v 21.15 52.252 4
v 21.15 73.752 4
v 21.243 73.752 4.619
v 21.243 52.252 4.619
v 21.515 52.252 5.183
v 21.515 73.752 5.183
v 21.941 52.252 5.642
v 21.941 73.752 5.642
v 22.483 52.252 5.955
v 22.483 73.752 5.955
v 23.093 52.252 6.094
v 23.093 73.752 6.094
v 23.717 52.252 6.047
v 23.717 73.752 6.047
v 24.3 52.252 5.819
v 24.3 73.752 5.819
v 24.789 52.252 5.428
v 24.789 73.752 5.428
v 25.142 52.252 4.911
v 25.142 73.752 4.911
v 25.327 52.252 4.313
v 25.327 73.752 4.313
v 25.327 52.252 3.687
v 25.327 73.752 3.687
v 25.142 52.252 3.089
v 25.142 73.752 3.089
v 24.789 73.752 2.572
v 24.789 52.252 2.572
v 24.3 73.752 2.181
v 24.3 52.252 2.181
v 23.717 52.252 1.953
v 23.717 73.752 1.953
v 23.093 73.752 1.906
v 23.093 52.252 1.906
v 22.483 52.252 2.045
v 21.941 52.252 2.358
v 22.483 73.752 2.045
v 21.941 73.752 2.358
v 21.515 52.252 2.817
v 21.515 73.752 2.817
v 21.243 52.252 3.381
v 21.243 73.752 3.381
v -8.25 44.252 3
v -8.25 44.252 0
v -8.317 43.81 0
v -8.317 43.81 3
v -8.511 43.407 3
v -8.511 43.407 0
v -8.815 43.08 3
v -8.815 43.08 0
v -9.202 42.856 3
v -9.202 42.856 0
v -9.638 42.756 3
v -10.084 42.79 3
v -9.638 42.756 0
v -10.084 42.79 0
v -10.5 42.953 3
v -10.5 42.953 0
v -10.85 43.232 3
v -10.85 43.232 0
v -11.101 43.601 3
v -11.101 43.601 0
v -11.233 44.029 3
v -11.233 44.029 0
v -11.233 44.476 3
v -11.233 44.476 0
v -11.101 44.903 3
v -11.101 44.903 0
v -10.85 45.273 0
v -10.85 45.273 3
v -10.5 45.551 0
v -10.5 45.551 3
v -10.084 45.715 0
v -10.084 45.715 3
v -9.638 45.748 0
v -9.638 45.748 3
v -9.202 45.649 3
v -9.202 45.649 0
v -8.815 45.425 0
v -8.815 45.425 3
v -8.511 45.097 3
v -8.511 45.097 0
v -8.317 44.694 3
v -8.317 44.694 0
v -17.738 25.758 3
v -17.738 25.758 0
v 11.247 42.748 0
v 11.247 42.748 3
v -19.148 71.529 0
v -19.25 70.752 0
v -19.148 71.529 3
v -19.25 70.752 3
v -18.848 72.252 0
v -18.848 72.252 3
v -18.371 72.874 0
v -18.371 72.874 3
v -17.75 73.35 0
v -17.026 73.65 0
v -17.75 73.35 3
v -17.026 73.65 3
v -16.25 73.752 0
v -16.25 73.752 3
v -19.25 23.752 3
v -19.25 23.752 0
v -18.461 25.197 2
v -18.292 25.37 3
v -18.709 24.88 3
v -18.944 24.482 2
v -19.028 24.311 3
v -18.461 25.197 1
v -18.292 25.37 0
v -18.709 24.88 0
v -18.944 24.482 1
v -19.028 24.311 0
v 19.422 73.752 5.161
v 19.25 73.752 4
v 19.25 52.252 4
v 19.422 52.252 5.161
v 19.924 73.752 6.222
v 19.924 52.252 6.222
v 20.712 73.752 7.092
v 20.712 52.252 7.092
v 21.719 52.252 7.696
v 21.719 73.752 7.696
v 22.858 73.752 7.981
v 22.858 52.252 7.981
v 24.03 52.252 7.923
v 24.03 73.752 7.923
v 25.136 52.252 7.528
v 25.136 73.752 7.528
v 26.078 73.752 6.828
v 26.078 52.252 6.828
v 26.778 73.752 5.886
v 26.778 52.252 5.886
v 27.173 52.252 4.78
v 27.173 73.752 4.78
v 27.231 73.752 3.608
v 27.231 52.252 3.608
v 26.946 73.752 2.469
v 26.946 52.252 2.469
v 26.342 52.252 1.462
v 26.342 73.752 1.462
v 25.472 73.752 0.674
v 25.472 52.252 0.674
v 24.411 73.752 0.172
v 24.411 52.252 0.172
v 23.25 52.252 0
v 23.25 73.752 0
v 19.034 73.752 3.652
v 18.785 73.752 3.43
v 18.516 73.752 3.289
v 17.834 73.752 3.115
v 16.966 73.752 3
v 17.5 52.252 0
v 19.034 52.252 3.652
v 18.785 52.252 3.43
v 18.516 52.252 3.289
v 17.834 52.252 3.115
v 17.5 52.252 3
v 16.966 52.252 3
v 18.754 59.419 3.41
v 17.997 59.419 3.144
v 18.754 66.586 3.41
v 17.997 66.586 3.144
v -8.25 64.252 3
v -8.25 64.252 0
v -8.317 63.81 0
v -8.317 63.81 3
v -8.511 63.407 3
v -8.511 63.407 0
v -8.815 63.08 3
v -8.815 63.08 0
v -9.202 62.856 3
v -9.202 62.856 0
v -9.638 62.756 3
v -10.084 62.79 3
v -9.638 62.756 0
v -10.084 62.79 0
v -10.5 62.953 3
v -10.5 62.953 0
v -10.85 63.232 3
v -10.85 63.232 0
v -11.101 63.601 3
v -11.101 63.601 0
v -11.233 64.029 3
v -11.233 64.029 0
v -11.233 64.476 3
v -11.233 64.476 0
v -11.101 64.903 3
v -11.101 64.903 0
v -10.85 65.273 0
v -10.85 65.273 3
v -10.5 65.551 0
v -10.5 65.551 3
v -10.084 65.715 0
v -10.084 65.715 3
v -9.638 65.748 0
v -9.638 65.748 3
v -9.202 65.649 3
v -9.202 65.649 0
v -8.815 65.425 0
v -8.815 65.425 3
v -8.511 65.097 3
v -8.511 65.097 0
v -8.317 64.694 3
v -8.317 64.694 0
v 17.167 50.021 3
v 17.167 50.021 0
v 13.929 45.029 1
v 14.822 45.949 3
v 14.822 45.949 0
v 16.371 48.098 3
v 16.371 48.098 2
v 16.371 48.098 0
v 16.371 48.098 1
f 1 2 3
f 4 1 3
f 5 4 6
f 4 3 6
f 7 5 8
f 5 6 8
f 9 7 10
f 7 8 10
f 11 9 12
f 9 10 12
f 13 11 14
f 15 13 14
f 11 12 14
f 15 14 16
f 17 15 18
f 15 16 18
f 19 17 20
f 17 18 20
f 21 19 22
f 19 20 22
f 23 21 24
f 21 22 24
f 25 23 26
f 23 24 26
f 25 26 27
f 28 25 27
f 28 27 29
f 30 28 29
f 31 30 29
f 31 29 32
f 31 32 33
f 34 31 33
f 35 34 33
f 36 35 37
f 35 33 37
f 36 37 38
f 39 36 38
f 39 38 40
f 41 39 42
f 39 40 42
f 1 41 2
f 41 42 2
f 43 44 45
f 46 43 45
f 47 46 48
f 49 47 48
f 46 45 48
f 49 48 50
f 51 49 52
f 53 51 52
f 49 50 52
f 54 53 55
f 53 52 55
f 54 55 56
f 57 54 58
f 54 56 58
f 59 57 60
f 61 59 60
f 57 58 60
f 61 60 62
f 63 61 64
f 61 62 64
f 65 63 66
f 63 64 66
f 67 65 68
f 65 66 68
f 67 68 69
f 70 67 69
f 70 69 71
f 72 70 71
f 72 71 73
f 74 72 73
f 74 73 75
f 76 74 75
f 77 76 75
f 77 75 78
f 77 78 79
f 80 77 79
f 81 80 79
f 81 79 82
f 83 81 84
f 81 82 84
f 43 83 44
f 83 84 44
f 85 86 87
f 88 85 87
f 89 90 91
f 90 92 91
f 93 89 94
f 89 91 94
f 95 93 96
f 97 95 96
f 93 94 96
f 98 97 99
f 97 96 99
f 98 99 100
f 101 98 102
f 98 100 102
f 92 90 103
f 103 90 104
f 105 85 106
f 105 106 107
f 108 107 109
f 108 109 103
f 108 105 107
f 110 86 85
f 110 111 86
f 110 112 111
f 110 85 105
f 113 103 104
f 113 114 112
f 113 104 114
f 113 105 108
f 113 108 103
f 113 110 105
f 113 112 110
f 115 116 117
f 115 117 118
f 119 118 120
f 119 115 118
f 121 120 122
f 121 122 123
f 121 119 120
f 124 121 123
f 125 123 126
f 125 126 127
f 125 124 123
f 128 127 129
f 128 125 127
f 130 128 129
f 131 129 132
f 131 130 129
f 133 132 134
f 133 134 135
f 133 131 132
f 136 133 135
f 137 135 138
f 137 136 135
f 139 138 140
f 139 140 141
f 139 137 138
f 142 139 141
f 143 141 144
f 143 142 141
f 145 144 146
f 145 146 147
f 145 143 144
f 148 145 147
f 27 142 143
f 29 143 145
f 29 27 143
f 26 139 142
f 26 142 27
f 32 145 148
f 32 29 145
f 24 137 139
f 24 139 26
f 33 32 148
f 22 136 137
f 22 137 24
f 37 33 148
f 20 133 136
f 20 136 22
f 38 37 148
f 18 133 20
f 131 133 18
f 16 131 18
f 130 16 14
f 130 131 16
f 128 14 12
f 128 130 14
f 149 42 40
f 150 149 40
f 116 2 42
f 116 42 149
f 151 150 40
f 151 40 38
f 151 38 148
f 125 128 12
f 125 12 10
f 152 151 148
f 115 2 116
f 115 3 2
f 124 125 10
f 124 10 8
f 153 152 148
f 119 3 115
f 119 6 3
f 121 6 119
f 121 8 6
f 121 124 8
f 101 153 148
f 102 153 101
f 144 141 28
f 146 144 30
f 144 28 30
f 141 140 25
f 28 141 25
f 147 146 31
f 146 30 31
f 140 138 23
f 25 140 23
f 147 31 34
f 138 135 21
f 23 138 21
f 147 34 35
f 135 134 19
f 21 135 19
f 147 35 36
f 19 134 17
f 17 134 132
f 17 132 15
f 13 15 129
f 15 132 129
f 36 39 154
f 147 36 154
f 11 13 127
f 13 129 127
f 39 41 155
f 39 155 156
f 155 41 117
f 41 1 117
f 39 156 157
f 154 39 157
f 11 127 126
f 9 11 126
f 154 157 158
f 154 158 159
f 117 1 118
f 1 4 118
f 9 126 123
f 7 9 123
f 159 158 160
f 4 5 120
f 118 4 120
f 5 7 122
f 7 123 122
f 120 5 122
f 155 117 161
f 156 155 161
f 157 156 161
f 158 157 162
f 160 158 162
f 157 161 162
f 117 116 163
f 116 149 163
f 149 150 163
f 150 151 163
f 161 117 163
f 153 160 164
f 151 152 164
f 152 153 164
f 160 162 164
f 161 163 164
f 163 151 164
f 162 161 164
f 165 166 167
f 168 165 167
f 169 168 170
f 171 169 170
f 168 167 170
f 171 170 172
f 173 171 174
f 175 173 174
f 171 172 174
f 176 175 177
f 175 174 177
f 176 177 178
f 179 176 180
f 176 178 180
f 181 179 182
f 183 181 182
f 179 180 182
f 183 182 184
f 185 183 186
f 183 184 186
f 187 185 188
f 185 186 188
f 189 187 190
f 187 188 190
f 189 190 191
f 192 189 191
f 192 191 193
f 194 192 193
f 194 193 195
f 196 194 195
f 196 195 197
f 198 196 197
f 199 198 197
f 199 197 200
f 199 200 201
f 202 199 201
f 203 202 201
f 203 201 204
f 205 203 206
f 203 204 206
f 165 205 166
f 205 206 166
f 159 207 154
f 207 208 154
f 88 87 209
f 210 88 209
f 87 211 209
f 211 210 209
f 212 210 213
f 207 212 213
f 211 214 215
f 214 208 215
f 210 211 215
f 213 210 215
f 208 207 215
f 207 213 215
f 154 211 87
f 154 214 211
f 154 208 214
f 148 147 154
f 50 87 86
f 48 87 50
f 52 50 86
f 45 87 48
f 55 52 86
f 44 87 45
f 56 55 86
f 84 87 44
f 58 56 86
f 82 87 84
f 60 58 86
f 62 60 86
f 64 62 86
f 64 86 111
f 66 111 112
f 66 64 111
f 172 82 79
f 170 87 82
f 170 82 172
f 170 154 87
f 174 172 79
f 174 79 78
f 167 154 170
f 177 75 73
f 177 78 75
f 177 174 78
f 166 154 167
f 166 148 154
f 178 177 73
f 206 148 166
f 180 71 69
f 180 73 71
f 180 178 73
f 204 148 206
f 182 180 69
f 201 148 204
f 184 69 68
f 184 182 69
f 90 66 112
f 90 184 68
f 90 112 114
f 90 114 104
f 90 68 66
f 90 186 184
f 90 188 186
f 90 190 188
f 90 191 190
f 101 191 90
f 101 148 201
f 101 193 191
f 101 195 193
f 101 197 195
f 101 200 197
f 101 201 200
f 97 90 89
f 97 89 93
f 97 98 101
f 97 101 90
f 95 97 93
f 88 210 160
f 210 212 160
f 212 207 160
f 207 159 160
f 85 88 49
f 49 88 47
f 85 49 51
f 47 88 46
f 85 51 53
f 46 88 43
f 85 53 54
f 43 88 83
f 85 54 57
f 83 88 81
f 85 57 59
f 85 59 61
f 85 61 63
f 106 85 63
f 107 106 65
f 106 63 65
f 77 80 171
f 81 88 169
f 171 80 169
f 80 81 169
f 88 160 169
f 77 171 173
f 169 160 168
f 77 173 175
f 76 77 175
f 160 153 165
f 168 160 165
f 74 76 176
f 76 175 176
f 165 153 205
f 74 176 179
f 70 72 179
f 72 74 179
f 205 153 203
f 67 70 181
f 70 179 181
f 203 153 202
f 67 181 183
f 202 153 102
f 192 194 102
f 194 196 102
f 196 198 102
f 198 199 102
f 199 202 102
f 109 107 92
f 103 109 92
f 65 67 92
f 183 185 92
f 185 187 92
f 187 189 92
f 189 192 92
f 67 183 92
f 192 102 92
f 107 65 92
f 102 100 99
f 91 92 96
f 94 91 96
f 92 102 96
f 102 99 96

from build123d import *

# Parameters (mm, degrees)
F1_DEPTH = 3
F2_R     = 2.1
F3_DEPTH = 21.5
F4_R     = 3
F5_R     = 1.5
F6_DEPTH = 3


with BuildPart() as f1:
    # F0 (on Top) → F1 (new body)
    with BuildSketch(Plane.XY):
        with BuildLine():
            add(Edge.make_bspline(
                [(-17.7381685377, 25.758469689), (-18.6029082943, 25.3198112197), (-19.0115179867, 24.4438797075), (-19.25, 23.7522523094)],
                knots=[0, 0, 0, 0, 2.5120793269, 2.5120793269, 2.5120793269, 2.5120793269], degree=3))
            Line((-17.7381685377, 25.758469689), (11.2471123299, 42.7481702213))
            add(Edge.make_bspline(
                [(11.2471123299, 42.7481702213), (13.6908411554, 44.7339186325), (17.38480106, 47.4555082619), (17.5, 52.2522523094)],
                knots=[0, 0, 0, 0, 11.376562774, 11.376562774, 11.376562774, 11.376562774], degree=3))
            Line((17.5, 52.2522523094), (19.25, 52.2522523094))
            Line((19.25, 52.2522523094), (19.25, 73.7522523094))
            Line((19.25, 73.7522523094), (-19.25, 73.7522523094))
            Line((-19.25, 73.7522523094), (-19.25, 23.7522523094))
        make_face()
    extrude(amount=F1_DEPTH)

    # F2 (on face) → F3 (join)
    with BuildSketch(Plane(origin=(0, 73.7522523094, 0), x_dir=(-1, 0, 0), z_dir=(0, 1, 0))):
        with BuildLine():
            ThreePointArc((-23.25, 0), (-20.4215728753, 1.1715728753), (-19.25, 4))
            ThreePointArc((-19.25, 4), (-26.0784271247, 6.8284271247), (-23.25, 0))
        make_face()
        with Locations((-23.25, 4)):
            Circle(F2_R, mode=Mode.SUBTRACT)
        with BuildLine():
            Line((-23.25, 0), (-19.25, 0))
            Line((-19.25, 0), (-19.25, 3))
            Line((-19.25, 3), (-16.9664081186, 3))
            add(Edge.make_bspline(
                [(-19.25, 4), (-18.8806392252, 3.1797552947), (-18.1370340288, 3.1503054779), (-16.9664081186, 3)],
                knots=[0, 0, 0, 0, 2.4929484312, 2.4929484312, 2.4929484312, 2.4929484312], degree=3))
            ThreePointArc((-19.25, 4), (-20.4215728753, 1.1715728753), (-23.25, 0))
        make_face()
    extrude(amount=-F3_DEPTH)

    # F4
    f4_edges = [f1.edges().sort_by_distance(p)[0] for p in [
        (-19.25, 73.752252, 1.5),
    ]]
    fillet(f4_edges, radius=F4_R)

    # F5 (on face) → F6 (cut)
    with BuildSketch(Plane(origin=(0, 0, 0), x_dir=(1, 0, 0), z_dir=(0, 0, -1))):
        with Locations((-9.75, -64.2522523094)):
            Circle(F5_R)
        with Locations((-9.75, -44.2522523094)):
            Circle(F5_R)
    extrude(amount=-F6_DEPTH, mode=Mode.SUBTRACT)


solid = f1.part
